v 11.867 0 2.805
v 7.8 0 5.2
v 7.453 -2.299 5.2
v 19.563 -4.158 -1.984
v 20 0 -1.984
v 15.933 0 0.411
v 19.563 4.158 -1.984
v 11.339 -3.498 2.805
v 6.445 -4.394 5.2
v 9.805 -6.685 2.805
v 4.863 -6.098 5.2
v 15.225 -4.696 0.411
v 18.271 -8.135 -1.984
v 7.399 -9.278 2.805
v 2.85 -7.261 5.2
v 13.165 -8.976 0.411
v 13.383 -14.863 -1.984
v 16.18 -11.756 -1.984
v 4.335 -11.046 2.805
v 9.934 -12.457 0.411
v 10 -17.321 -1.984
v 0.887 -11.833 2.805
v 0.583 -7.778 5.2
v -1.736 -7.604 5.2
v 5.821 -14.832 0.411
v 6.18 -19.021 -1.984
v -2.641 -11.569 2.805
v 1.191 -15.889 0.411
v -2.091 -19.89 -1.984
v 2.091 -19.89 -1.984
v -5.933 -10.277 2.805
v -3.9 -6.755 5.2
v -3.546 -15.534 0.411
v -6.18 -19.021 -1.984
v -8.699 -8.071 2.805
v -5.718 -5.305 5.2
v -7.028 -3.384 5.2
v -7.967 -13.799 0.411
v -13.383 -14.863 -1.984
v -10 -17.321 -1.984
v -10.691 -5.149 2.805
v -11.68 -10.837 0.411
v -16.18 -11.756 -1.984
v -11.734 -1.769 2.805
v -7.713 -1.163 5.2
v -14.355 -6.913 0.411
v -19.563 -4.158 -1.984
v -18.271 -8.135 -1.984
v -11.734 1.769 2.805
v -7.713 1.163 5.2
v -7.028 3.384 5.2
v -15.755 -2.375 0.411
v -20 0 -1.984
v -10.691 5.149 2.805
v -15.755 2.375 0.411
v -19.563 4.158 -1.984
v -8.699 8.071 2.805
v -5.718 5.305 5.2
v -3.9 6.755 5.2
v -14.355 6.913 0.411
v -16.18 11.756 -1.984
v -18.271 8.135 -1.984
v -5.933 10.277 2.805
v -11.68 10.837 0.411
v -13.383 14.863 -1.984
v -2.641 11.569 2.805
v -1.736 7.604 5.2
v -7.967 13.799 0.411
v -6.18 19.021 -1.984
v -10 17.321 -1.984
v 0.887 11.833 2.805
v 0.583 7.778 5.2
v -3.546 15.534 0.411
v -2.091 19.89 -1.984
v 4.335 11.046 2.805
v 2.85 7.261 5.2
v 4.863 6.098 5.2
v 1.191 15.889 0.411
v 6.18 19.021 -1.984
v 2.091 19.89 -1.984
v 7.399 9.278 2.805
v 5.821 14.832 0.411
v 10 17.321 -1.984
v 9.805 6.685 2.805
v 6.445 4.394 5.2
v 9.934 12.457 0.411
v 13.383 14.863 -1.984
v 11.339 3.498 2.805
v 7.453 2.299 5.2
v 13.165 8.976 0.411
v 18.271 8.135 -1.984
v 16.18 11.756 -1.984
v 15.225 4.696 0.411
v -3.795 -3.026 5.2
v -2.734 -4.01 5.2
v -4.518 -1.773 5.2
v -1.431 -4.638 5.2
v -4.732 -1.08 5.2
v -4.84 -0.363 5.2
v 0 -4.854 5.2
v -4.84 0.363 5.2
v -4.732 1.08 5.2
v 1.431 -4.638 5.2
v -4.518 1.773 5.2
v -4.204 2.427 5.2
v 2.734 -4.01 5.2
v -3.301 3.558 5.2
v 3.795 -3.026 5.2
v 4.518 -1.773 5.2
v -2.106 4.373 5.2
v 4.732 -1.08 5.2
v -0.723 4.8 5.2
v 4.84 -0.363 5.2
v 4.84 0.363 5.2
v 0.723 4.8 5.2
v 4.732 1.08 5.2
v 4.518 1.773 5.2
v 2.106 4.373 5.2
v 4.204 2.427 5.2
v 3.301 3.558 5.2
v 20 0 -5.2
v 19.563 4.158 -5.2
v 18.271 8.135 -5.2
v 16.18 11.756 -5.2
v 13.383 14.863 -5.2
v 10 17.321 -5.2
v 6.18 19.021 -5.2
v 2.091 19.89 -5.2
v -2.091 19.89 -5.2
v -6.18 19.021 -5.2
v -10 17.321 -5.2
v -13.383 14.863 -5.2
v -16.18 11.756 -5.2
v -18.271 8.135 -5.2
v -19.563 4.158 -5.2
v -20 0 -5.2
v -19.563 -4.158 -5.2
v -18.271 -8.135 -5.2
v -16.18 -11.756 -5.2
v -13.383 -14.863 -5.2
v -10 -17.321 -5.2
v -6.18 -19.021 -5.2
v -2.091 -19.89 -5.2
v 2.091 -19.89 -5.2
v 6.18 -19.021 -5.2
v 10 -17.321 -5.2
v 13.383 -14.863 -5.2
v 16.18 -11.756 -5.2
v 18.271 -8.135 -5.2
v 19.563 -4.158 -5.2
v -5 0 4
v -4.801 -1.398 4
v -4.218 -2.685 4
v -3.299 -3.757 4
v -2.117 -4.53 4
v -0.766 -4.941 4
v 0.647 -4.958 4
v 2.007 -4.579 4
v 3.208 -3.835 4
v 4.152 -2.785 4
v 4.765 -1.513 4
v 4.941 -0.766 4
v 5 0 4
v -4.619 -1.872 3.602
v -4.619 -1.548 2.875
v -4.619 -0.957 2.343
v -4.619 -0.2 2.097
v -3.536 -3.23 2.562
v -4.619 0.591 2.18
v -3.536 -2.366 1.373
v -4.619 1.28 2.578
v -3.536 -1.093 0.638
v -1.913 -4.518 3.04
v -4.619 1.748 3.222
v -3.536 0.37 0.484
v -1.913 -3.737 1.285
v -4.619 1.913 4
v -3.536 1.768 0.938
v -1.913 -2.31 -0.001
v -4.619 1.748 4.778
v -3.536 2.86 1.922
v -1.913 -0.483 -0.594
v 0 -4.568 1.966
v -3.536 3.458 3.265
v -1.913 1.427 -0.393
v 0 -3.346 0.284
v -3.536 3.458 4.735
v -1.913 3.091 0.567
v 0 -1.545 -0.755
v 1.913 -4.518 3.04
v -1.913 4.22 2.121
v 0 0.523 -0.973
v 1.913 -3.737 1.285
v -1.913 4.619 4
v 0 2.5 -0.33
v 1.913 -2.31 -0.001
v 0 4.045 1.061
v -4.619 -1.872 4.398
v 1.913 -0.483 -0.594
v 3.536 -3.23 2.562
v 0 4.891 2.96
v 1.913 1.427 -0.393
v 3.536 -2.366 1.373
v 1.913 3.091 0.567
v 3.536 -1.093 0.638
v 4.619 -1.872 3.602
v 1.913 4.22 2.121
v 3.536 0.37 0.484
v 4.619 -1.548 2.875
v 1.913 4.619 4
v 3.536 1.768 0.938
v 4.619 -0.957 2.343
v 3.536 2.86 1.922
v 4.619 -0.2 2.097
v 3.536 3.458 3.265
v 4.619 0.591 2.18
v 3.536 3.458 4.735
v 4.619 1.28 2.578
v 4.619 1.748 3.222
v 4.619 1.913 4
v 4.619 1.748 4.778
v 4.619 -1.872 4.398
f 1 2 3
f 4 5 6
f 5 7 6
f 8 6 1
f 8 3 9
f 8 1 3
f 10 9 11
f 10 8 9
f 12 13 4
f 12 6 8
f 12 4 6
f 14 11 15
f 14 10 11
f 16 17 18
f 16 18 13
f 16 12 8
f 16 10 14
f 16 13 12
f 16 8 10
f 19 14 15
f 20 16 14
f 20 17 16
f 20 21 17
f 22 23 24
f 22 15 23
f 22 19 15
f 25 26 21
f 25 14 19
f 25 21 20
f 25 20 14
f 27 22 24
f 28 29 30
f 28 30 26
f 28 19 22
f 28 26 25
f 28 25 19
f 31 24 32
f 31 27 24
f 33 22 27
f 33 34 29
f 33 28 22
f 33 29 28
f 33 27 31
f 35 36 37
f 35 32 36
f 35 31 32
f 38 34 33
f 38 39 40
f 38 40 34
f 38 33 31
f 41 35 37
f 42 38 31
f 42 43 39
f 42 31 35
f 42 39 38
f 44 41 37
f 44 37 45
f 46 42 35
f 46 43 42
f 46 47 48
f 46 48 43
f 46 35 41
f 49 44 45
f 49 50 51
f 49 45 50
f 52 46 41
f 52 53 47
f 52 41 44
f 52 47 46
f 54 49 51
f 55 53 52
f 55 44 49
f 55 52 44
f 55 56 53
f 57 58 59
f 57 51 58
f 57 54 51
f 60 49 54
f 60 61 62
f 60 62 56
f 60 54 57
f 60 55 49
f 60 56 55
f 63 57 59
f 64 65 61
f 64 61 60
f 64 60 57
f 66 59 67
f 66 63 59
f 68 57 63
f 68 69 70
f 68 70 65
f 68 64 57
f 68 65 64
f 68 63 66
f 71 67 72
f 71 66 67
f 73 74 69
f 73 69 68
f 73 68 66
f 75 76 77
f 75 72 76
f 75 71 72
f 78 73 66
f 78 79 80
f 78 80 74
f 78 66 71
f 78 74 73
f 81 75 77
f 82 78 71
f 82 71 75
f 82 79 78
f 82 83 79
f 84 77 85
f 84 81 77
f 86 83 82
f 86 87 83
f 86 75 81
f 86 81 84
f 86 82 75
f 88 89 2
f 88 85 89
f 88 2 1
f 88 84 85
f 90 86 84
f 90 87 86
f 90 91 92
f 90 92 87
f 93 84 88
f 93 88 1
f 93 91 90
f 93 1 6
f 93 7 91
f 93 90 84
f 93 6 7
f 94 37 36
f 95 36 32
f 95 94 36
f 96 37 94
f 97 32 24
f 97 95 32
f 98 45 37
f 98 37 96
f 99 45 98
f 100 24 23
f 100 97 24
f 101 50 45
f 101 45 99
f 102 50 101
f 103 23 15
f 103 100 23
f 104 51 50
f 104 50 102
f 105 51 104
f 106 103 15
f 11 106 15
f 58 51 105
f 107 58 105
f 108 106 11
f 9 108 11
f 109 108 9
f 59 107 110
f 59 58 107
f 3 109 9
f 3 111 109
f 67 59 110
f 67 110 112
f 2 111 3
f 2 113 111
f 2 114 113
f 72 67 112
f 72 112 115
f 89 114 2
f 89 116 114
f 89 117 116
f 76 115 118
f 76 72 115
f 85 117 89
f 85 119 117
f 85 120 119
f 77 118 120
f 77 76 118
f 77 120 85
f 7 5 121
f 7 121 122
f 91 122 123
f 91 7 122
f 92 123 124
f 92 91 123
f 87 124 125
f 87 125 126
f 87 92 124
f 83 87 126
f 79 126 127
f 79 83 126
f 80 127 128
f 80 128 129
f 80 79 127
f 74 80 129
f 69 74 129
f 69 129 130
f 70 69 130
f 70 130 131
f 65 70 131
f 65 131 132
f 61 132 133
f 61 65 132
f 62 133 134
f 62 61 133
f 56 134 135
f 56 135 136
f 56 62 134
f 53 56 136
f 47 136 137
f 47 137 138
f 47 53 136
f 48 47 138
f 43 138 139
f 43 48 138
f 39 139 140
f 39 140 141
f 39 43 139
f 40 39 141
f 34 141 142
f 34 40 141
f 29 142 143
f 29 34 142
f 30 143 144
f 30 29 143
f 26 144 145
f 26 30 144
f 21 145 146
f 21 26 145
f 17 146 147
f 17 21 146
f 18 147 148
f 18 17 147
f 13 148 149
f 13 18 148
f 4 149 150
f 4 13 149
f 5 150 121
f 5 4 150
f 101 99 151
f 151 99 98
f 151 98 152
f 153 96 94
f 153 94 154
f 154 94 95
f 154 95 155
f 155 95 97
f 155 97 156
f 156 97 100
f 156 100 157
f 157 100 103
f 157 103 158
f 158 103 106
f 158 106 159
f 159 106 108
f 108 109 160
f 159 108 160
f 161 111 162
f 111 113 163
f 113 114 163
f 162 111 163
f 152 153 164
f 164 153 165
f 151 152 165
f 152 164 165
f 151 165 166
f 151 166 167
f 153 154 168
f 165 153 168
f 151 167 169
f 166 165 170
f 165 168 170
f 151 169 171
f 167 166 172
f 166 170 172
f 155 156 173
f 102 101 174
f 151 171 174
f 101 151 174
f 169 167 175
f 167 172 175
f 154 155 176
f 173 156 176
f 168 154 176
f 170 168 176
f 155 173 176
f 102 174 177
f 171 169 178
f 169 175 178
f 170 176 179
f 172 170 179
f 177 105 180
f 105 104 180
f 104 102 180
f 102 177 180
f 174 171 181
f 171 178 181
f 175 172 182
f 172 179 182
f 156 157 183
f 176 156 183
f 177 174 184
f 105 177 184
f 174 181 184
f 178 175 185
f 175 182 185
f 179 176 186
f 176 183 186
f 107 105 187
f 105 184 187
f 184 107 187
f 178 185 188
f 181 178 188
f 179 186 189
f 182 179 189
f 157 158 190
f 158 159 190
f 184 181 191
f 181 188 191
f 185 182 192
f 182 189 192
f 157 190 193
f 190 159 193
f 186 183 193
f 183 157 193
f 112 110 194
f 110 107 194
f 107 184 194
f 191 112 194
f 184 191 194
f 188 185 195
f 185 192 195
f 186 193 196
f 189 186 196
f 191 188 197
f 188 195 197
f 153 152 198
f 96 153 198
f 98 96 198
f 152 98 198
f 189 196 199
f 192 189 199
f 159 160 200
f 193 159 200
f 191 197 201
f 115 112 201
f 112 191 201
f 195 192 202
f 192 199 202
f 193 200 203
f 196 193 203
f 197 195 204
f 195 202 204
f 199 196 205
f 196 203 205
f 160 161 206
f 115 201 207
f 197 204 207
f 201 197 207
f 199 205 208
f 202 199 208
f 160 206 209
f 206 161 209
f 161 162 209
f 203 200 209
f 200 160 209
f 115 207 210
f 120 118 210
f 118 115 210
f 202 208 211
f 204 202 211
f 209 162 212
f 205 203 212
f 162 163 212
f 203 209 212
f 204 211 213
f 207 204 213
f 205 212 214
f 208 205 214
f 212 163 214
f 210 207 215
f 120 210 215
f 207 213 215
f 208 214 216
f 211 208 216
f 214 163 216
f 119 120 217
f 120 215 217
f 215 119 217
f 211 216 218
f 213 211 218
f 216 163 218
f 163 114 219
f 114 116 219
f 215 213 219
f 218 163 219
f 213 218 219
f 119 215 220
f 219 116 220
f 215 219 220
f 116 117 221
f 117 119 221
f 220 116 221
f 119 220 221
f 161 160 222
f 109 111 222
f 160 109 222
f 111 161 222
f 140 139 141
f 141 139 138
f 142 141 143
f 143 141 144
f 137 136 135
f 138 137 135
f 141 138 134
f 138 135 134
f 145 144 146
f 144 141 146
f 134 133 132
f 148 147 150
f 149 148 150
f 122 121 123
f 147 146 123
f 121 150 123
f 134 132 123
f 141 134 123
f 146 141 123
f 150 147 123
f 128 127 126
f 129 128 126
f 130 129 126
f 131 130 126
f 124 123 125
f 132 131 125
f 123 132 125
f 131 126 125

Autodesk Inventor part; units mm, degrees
ref_plane "YZ Plane" through (0, 0, 0) normal (1, 0, 0) x (0, 1, 0)
ref_plane "XZ Plane" through (0, 0, 0) normal (0, 1, 0) x (-1, 0, 0)
sketch "Skizze1" plane through (0, 0, 0) normal (0, 0, 1) x (1, 0, 0)
  line L0 (0, -28) -> (0, 28) projected
  line L1 (-28, 0) -> (28, 0) projected
  circle A0 centre (0, 0) radius 20
  dimension "d0" = 40
extrude "Extrusion1" add sketch "Skizze1" along normal mid plane 10.4
ref_plane "Arbeitsebene1" through (0, 0, 4) normal (0, 0, 1) x (1, 0, 0)
sketch "Skizze3" plane through (0, 0, 4) normal (0, 0, 1) x (1, 0, 0)
  arc A0 (-5, 0) -> (5, 0) centre (0, 0) ccw
  line L0 (-28, 0) -> (28, 0) projected
  line L1 (-5, 0) -> (5, 0)
  dimension "d4" = 10
revolve "Umdrehung1" cut sketch "Skizze3" angle 360 about axis through (-10, 0, 4) along (1, 0, 0)
sketch "Skizze4" plane through (0, 0, 0) normal (0, 1, 0) x (-1, 0, 0)
  line L0 (-20, -5.2) -> (20, -5.2) projected
  line L1 (20, 5.2) -> (-20, 5.2) projected
  line L2 (-20, -5.2) -> (-20, 5.2) projected
  line L3 (28, 0) -> (-28, 0) projected
  line L4 (0, -7.28) -> (0, 7.28) projected
  line L5 (20, 5.2) -> (-20, 5.2) projected
  line L6 (-7.8, 5.2) -> (-20, -1.9841)
  line L7 (-20, -1.9841) -> (-20, 5.2)
  line L8 (-20, 5.2) -> (-7.8, 5.2)
  point P0 (0, 0)
revolve "Umdrehung2" cut sketch "Skizze4" angle 360 about axis through (0, 0, -10) along (0, 0, 1) contours L2 L3 L6 | L2 L1 L6 L3
properties part number "Plastikfuß_40mm" material "ABS-Kunststoff"
